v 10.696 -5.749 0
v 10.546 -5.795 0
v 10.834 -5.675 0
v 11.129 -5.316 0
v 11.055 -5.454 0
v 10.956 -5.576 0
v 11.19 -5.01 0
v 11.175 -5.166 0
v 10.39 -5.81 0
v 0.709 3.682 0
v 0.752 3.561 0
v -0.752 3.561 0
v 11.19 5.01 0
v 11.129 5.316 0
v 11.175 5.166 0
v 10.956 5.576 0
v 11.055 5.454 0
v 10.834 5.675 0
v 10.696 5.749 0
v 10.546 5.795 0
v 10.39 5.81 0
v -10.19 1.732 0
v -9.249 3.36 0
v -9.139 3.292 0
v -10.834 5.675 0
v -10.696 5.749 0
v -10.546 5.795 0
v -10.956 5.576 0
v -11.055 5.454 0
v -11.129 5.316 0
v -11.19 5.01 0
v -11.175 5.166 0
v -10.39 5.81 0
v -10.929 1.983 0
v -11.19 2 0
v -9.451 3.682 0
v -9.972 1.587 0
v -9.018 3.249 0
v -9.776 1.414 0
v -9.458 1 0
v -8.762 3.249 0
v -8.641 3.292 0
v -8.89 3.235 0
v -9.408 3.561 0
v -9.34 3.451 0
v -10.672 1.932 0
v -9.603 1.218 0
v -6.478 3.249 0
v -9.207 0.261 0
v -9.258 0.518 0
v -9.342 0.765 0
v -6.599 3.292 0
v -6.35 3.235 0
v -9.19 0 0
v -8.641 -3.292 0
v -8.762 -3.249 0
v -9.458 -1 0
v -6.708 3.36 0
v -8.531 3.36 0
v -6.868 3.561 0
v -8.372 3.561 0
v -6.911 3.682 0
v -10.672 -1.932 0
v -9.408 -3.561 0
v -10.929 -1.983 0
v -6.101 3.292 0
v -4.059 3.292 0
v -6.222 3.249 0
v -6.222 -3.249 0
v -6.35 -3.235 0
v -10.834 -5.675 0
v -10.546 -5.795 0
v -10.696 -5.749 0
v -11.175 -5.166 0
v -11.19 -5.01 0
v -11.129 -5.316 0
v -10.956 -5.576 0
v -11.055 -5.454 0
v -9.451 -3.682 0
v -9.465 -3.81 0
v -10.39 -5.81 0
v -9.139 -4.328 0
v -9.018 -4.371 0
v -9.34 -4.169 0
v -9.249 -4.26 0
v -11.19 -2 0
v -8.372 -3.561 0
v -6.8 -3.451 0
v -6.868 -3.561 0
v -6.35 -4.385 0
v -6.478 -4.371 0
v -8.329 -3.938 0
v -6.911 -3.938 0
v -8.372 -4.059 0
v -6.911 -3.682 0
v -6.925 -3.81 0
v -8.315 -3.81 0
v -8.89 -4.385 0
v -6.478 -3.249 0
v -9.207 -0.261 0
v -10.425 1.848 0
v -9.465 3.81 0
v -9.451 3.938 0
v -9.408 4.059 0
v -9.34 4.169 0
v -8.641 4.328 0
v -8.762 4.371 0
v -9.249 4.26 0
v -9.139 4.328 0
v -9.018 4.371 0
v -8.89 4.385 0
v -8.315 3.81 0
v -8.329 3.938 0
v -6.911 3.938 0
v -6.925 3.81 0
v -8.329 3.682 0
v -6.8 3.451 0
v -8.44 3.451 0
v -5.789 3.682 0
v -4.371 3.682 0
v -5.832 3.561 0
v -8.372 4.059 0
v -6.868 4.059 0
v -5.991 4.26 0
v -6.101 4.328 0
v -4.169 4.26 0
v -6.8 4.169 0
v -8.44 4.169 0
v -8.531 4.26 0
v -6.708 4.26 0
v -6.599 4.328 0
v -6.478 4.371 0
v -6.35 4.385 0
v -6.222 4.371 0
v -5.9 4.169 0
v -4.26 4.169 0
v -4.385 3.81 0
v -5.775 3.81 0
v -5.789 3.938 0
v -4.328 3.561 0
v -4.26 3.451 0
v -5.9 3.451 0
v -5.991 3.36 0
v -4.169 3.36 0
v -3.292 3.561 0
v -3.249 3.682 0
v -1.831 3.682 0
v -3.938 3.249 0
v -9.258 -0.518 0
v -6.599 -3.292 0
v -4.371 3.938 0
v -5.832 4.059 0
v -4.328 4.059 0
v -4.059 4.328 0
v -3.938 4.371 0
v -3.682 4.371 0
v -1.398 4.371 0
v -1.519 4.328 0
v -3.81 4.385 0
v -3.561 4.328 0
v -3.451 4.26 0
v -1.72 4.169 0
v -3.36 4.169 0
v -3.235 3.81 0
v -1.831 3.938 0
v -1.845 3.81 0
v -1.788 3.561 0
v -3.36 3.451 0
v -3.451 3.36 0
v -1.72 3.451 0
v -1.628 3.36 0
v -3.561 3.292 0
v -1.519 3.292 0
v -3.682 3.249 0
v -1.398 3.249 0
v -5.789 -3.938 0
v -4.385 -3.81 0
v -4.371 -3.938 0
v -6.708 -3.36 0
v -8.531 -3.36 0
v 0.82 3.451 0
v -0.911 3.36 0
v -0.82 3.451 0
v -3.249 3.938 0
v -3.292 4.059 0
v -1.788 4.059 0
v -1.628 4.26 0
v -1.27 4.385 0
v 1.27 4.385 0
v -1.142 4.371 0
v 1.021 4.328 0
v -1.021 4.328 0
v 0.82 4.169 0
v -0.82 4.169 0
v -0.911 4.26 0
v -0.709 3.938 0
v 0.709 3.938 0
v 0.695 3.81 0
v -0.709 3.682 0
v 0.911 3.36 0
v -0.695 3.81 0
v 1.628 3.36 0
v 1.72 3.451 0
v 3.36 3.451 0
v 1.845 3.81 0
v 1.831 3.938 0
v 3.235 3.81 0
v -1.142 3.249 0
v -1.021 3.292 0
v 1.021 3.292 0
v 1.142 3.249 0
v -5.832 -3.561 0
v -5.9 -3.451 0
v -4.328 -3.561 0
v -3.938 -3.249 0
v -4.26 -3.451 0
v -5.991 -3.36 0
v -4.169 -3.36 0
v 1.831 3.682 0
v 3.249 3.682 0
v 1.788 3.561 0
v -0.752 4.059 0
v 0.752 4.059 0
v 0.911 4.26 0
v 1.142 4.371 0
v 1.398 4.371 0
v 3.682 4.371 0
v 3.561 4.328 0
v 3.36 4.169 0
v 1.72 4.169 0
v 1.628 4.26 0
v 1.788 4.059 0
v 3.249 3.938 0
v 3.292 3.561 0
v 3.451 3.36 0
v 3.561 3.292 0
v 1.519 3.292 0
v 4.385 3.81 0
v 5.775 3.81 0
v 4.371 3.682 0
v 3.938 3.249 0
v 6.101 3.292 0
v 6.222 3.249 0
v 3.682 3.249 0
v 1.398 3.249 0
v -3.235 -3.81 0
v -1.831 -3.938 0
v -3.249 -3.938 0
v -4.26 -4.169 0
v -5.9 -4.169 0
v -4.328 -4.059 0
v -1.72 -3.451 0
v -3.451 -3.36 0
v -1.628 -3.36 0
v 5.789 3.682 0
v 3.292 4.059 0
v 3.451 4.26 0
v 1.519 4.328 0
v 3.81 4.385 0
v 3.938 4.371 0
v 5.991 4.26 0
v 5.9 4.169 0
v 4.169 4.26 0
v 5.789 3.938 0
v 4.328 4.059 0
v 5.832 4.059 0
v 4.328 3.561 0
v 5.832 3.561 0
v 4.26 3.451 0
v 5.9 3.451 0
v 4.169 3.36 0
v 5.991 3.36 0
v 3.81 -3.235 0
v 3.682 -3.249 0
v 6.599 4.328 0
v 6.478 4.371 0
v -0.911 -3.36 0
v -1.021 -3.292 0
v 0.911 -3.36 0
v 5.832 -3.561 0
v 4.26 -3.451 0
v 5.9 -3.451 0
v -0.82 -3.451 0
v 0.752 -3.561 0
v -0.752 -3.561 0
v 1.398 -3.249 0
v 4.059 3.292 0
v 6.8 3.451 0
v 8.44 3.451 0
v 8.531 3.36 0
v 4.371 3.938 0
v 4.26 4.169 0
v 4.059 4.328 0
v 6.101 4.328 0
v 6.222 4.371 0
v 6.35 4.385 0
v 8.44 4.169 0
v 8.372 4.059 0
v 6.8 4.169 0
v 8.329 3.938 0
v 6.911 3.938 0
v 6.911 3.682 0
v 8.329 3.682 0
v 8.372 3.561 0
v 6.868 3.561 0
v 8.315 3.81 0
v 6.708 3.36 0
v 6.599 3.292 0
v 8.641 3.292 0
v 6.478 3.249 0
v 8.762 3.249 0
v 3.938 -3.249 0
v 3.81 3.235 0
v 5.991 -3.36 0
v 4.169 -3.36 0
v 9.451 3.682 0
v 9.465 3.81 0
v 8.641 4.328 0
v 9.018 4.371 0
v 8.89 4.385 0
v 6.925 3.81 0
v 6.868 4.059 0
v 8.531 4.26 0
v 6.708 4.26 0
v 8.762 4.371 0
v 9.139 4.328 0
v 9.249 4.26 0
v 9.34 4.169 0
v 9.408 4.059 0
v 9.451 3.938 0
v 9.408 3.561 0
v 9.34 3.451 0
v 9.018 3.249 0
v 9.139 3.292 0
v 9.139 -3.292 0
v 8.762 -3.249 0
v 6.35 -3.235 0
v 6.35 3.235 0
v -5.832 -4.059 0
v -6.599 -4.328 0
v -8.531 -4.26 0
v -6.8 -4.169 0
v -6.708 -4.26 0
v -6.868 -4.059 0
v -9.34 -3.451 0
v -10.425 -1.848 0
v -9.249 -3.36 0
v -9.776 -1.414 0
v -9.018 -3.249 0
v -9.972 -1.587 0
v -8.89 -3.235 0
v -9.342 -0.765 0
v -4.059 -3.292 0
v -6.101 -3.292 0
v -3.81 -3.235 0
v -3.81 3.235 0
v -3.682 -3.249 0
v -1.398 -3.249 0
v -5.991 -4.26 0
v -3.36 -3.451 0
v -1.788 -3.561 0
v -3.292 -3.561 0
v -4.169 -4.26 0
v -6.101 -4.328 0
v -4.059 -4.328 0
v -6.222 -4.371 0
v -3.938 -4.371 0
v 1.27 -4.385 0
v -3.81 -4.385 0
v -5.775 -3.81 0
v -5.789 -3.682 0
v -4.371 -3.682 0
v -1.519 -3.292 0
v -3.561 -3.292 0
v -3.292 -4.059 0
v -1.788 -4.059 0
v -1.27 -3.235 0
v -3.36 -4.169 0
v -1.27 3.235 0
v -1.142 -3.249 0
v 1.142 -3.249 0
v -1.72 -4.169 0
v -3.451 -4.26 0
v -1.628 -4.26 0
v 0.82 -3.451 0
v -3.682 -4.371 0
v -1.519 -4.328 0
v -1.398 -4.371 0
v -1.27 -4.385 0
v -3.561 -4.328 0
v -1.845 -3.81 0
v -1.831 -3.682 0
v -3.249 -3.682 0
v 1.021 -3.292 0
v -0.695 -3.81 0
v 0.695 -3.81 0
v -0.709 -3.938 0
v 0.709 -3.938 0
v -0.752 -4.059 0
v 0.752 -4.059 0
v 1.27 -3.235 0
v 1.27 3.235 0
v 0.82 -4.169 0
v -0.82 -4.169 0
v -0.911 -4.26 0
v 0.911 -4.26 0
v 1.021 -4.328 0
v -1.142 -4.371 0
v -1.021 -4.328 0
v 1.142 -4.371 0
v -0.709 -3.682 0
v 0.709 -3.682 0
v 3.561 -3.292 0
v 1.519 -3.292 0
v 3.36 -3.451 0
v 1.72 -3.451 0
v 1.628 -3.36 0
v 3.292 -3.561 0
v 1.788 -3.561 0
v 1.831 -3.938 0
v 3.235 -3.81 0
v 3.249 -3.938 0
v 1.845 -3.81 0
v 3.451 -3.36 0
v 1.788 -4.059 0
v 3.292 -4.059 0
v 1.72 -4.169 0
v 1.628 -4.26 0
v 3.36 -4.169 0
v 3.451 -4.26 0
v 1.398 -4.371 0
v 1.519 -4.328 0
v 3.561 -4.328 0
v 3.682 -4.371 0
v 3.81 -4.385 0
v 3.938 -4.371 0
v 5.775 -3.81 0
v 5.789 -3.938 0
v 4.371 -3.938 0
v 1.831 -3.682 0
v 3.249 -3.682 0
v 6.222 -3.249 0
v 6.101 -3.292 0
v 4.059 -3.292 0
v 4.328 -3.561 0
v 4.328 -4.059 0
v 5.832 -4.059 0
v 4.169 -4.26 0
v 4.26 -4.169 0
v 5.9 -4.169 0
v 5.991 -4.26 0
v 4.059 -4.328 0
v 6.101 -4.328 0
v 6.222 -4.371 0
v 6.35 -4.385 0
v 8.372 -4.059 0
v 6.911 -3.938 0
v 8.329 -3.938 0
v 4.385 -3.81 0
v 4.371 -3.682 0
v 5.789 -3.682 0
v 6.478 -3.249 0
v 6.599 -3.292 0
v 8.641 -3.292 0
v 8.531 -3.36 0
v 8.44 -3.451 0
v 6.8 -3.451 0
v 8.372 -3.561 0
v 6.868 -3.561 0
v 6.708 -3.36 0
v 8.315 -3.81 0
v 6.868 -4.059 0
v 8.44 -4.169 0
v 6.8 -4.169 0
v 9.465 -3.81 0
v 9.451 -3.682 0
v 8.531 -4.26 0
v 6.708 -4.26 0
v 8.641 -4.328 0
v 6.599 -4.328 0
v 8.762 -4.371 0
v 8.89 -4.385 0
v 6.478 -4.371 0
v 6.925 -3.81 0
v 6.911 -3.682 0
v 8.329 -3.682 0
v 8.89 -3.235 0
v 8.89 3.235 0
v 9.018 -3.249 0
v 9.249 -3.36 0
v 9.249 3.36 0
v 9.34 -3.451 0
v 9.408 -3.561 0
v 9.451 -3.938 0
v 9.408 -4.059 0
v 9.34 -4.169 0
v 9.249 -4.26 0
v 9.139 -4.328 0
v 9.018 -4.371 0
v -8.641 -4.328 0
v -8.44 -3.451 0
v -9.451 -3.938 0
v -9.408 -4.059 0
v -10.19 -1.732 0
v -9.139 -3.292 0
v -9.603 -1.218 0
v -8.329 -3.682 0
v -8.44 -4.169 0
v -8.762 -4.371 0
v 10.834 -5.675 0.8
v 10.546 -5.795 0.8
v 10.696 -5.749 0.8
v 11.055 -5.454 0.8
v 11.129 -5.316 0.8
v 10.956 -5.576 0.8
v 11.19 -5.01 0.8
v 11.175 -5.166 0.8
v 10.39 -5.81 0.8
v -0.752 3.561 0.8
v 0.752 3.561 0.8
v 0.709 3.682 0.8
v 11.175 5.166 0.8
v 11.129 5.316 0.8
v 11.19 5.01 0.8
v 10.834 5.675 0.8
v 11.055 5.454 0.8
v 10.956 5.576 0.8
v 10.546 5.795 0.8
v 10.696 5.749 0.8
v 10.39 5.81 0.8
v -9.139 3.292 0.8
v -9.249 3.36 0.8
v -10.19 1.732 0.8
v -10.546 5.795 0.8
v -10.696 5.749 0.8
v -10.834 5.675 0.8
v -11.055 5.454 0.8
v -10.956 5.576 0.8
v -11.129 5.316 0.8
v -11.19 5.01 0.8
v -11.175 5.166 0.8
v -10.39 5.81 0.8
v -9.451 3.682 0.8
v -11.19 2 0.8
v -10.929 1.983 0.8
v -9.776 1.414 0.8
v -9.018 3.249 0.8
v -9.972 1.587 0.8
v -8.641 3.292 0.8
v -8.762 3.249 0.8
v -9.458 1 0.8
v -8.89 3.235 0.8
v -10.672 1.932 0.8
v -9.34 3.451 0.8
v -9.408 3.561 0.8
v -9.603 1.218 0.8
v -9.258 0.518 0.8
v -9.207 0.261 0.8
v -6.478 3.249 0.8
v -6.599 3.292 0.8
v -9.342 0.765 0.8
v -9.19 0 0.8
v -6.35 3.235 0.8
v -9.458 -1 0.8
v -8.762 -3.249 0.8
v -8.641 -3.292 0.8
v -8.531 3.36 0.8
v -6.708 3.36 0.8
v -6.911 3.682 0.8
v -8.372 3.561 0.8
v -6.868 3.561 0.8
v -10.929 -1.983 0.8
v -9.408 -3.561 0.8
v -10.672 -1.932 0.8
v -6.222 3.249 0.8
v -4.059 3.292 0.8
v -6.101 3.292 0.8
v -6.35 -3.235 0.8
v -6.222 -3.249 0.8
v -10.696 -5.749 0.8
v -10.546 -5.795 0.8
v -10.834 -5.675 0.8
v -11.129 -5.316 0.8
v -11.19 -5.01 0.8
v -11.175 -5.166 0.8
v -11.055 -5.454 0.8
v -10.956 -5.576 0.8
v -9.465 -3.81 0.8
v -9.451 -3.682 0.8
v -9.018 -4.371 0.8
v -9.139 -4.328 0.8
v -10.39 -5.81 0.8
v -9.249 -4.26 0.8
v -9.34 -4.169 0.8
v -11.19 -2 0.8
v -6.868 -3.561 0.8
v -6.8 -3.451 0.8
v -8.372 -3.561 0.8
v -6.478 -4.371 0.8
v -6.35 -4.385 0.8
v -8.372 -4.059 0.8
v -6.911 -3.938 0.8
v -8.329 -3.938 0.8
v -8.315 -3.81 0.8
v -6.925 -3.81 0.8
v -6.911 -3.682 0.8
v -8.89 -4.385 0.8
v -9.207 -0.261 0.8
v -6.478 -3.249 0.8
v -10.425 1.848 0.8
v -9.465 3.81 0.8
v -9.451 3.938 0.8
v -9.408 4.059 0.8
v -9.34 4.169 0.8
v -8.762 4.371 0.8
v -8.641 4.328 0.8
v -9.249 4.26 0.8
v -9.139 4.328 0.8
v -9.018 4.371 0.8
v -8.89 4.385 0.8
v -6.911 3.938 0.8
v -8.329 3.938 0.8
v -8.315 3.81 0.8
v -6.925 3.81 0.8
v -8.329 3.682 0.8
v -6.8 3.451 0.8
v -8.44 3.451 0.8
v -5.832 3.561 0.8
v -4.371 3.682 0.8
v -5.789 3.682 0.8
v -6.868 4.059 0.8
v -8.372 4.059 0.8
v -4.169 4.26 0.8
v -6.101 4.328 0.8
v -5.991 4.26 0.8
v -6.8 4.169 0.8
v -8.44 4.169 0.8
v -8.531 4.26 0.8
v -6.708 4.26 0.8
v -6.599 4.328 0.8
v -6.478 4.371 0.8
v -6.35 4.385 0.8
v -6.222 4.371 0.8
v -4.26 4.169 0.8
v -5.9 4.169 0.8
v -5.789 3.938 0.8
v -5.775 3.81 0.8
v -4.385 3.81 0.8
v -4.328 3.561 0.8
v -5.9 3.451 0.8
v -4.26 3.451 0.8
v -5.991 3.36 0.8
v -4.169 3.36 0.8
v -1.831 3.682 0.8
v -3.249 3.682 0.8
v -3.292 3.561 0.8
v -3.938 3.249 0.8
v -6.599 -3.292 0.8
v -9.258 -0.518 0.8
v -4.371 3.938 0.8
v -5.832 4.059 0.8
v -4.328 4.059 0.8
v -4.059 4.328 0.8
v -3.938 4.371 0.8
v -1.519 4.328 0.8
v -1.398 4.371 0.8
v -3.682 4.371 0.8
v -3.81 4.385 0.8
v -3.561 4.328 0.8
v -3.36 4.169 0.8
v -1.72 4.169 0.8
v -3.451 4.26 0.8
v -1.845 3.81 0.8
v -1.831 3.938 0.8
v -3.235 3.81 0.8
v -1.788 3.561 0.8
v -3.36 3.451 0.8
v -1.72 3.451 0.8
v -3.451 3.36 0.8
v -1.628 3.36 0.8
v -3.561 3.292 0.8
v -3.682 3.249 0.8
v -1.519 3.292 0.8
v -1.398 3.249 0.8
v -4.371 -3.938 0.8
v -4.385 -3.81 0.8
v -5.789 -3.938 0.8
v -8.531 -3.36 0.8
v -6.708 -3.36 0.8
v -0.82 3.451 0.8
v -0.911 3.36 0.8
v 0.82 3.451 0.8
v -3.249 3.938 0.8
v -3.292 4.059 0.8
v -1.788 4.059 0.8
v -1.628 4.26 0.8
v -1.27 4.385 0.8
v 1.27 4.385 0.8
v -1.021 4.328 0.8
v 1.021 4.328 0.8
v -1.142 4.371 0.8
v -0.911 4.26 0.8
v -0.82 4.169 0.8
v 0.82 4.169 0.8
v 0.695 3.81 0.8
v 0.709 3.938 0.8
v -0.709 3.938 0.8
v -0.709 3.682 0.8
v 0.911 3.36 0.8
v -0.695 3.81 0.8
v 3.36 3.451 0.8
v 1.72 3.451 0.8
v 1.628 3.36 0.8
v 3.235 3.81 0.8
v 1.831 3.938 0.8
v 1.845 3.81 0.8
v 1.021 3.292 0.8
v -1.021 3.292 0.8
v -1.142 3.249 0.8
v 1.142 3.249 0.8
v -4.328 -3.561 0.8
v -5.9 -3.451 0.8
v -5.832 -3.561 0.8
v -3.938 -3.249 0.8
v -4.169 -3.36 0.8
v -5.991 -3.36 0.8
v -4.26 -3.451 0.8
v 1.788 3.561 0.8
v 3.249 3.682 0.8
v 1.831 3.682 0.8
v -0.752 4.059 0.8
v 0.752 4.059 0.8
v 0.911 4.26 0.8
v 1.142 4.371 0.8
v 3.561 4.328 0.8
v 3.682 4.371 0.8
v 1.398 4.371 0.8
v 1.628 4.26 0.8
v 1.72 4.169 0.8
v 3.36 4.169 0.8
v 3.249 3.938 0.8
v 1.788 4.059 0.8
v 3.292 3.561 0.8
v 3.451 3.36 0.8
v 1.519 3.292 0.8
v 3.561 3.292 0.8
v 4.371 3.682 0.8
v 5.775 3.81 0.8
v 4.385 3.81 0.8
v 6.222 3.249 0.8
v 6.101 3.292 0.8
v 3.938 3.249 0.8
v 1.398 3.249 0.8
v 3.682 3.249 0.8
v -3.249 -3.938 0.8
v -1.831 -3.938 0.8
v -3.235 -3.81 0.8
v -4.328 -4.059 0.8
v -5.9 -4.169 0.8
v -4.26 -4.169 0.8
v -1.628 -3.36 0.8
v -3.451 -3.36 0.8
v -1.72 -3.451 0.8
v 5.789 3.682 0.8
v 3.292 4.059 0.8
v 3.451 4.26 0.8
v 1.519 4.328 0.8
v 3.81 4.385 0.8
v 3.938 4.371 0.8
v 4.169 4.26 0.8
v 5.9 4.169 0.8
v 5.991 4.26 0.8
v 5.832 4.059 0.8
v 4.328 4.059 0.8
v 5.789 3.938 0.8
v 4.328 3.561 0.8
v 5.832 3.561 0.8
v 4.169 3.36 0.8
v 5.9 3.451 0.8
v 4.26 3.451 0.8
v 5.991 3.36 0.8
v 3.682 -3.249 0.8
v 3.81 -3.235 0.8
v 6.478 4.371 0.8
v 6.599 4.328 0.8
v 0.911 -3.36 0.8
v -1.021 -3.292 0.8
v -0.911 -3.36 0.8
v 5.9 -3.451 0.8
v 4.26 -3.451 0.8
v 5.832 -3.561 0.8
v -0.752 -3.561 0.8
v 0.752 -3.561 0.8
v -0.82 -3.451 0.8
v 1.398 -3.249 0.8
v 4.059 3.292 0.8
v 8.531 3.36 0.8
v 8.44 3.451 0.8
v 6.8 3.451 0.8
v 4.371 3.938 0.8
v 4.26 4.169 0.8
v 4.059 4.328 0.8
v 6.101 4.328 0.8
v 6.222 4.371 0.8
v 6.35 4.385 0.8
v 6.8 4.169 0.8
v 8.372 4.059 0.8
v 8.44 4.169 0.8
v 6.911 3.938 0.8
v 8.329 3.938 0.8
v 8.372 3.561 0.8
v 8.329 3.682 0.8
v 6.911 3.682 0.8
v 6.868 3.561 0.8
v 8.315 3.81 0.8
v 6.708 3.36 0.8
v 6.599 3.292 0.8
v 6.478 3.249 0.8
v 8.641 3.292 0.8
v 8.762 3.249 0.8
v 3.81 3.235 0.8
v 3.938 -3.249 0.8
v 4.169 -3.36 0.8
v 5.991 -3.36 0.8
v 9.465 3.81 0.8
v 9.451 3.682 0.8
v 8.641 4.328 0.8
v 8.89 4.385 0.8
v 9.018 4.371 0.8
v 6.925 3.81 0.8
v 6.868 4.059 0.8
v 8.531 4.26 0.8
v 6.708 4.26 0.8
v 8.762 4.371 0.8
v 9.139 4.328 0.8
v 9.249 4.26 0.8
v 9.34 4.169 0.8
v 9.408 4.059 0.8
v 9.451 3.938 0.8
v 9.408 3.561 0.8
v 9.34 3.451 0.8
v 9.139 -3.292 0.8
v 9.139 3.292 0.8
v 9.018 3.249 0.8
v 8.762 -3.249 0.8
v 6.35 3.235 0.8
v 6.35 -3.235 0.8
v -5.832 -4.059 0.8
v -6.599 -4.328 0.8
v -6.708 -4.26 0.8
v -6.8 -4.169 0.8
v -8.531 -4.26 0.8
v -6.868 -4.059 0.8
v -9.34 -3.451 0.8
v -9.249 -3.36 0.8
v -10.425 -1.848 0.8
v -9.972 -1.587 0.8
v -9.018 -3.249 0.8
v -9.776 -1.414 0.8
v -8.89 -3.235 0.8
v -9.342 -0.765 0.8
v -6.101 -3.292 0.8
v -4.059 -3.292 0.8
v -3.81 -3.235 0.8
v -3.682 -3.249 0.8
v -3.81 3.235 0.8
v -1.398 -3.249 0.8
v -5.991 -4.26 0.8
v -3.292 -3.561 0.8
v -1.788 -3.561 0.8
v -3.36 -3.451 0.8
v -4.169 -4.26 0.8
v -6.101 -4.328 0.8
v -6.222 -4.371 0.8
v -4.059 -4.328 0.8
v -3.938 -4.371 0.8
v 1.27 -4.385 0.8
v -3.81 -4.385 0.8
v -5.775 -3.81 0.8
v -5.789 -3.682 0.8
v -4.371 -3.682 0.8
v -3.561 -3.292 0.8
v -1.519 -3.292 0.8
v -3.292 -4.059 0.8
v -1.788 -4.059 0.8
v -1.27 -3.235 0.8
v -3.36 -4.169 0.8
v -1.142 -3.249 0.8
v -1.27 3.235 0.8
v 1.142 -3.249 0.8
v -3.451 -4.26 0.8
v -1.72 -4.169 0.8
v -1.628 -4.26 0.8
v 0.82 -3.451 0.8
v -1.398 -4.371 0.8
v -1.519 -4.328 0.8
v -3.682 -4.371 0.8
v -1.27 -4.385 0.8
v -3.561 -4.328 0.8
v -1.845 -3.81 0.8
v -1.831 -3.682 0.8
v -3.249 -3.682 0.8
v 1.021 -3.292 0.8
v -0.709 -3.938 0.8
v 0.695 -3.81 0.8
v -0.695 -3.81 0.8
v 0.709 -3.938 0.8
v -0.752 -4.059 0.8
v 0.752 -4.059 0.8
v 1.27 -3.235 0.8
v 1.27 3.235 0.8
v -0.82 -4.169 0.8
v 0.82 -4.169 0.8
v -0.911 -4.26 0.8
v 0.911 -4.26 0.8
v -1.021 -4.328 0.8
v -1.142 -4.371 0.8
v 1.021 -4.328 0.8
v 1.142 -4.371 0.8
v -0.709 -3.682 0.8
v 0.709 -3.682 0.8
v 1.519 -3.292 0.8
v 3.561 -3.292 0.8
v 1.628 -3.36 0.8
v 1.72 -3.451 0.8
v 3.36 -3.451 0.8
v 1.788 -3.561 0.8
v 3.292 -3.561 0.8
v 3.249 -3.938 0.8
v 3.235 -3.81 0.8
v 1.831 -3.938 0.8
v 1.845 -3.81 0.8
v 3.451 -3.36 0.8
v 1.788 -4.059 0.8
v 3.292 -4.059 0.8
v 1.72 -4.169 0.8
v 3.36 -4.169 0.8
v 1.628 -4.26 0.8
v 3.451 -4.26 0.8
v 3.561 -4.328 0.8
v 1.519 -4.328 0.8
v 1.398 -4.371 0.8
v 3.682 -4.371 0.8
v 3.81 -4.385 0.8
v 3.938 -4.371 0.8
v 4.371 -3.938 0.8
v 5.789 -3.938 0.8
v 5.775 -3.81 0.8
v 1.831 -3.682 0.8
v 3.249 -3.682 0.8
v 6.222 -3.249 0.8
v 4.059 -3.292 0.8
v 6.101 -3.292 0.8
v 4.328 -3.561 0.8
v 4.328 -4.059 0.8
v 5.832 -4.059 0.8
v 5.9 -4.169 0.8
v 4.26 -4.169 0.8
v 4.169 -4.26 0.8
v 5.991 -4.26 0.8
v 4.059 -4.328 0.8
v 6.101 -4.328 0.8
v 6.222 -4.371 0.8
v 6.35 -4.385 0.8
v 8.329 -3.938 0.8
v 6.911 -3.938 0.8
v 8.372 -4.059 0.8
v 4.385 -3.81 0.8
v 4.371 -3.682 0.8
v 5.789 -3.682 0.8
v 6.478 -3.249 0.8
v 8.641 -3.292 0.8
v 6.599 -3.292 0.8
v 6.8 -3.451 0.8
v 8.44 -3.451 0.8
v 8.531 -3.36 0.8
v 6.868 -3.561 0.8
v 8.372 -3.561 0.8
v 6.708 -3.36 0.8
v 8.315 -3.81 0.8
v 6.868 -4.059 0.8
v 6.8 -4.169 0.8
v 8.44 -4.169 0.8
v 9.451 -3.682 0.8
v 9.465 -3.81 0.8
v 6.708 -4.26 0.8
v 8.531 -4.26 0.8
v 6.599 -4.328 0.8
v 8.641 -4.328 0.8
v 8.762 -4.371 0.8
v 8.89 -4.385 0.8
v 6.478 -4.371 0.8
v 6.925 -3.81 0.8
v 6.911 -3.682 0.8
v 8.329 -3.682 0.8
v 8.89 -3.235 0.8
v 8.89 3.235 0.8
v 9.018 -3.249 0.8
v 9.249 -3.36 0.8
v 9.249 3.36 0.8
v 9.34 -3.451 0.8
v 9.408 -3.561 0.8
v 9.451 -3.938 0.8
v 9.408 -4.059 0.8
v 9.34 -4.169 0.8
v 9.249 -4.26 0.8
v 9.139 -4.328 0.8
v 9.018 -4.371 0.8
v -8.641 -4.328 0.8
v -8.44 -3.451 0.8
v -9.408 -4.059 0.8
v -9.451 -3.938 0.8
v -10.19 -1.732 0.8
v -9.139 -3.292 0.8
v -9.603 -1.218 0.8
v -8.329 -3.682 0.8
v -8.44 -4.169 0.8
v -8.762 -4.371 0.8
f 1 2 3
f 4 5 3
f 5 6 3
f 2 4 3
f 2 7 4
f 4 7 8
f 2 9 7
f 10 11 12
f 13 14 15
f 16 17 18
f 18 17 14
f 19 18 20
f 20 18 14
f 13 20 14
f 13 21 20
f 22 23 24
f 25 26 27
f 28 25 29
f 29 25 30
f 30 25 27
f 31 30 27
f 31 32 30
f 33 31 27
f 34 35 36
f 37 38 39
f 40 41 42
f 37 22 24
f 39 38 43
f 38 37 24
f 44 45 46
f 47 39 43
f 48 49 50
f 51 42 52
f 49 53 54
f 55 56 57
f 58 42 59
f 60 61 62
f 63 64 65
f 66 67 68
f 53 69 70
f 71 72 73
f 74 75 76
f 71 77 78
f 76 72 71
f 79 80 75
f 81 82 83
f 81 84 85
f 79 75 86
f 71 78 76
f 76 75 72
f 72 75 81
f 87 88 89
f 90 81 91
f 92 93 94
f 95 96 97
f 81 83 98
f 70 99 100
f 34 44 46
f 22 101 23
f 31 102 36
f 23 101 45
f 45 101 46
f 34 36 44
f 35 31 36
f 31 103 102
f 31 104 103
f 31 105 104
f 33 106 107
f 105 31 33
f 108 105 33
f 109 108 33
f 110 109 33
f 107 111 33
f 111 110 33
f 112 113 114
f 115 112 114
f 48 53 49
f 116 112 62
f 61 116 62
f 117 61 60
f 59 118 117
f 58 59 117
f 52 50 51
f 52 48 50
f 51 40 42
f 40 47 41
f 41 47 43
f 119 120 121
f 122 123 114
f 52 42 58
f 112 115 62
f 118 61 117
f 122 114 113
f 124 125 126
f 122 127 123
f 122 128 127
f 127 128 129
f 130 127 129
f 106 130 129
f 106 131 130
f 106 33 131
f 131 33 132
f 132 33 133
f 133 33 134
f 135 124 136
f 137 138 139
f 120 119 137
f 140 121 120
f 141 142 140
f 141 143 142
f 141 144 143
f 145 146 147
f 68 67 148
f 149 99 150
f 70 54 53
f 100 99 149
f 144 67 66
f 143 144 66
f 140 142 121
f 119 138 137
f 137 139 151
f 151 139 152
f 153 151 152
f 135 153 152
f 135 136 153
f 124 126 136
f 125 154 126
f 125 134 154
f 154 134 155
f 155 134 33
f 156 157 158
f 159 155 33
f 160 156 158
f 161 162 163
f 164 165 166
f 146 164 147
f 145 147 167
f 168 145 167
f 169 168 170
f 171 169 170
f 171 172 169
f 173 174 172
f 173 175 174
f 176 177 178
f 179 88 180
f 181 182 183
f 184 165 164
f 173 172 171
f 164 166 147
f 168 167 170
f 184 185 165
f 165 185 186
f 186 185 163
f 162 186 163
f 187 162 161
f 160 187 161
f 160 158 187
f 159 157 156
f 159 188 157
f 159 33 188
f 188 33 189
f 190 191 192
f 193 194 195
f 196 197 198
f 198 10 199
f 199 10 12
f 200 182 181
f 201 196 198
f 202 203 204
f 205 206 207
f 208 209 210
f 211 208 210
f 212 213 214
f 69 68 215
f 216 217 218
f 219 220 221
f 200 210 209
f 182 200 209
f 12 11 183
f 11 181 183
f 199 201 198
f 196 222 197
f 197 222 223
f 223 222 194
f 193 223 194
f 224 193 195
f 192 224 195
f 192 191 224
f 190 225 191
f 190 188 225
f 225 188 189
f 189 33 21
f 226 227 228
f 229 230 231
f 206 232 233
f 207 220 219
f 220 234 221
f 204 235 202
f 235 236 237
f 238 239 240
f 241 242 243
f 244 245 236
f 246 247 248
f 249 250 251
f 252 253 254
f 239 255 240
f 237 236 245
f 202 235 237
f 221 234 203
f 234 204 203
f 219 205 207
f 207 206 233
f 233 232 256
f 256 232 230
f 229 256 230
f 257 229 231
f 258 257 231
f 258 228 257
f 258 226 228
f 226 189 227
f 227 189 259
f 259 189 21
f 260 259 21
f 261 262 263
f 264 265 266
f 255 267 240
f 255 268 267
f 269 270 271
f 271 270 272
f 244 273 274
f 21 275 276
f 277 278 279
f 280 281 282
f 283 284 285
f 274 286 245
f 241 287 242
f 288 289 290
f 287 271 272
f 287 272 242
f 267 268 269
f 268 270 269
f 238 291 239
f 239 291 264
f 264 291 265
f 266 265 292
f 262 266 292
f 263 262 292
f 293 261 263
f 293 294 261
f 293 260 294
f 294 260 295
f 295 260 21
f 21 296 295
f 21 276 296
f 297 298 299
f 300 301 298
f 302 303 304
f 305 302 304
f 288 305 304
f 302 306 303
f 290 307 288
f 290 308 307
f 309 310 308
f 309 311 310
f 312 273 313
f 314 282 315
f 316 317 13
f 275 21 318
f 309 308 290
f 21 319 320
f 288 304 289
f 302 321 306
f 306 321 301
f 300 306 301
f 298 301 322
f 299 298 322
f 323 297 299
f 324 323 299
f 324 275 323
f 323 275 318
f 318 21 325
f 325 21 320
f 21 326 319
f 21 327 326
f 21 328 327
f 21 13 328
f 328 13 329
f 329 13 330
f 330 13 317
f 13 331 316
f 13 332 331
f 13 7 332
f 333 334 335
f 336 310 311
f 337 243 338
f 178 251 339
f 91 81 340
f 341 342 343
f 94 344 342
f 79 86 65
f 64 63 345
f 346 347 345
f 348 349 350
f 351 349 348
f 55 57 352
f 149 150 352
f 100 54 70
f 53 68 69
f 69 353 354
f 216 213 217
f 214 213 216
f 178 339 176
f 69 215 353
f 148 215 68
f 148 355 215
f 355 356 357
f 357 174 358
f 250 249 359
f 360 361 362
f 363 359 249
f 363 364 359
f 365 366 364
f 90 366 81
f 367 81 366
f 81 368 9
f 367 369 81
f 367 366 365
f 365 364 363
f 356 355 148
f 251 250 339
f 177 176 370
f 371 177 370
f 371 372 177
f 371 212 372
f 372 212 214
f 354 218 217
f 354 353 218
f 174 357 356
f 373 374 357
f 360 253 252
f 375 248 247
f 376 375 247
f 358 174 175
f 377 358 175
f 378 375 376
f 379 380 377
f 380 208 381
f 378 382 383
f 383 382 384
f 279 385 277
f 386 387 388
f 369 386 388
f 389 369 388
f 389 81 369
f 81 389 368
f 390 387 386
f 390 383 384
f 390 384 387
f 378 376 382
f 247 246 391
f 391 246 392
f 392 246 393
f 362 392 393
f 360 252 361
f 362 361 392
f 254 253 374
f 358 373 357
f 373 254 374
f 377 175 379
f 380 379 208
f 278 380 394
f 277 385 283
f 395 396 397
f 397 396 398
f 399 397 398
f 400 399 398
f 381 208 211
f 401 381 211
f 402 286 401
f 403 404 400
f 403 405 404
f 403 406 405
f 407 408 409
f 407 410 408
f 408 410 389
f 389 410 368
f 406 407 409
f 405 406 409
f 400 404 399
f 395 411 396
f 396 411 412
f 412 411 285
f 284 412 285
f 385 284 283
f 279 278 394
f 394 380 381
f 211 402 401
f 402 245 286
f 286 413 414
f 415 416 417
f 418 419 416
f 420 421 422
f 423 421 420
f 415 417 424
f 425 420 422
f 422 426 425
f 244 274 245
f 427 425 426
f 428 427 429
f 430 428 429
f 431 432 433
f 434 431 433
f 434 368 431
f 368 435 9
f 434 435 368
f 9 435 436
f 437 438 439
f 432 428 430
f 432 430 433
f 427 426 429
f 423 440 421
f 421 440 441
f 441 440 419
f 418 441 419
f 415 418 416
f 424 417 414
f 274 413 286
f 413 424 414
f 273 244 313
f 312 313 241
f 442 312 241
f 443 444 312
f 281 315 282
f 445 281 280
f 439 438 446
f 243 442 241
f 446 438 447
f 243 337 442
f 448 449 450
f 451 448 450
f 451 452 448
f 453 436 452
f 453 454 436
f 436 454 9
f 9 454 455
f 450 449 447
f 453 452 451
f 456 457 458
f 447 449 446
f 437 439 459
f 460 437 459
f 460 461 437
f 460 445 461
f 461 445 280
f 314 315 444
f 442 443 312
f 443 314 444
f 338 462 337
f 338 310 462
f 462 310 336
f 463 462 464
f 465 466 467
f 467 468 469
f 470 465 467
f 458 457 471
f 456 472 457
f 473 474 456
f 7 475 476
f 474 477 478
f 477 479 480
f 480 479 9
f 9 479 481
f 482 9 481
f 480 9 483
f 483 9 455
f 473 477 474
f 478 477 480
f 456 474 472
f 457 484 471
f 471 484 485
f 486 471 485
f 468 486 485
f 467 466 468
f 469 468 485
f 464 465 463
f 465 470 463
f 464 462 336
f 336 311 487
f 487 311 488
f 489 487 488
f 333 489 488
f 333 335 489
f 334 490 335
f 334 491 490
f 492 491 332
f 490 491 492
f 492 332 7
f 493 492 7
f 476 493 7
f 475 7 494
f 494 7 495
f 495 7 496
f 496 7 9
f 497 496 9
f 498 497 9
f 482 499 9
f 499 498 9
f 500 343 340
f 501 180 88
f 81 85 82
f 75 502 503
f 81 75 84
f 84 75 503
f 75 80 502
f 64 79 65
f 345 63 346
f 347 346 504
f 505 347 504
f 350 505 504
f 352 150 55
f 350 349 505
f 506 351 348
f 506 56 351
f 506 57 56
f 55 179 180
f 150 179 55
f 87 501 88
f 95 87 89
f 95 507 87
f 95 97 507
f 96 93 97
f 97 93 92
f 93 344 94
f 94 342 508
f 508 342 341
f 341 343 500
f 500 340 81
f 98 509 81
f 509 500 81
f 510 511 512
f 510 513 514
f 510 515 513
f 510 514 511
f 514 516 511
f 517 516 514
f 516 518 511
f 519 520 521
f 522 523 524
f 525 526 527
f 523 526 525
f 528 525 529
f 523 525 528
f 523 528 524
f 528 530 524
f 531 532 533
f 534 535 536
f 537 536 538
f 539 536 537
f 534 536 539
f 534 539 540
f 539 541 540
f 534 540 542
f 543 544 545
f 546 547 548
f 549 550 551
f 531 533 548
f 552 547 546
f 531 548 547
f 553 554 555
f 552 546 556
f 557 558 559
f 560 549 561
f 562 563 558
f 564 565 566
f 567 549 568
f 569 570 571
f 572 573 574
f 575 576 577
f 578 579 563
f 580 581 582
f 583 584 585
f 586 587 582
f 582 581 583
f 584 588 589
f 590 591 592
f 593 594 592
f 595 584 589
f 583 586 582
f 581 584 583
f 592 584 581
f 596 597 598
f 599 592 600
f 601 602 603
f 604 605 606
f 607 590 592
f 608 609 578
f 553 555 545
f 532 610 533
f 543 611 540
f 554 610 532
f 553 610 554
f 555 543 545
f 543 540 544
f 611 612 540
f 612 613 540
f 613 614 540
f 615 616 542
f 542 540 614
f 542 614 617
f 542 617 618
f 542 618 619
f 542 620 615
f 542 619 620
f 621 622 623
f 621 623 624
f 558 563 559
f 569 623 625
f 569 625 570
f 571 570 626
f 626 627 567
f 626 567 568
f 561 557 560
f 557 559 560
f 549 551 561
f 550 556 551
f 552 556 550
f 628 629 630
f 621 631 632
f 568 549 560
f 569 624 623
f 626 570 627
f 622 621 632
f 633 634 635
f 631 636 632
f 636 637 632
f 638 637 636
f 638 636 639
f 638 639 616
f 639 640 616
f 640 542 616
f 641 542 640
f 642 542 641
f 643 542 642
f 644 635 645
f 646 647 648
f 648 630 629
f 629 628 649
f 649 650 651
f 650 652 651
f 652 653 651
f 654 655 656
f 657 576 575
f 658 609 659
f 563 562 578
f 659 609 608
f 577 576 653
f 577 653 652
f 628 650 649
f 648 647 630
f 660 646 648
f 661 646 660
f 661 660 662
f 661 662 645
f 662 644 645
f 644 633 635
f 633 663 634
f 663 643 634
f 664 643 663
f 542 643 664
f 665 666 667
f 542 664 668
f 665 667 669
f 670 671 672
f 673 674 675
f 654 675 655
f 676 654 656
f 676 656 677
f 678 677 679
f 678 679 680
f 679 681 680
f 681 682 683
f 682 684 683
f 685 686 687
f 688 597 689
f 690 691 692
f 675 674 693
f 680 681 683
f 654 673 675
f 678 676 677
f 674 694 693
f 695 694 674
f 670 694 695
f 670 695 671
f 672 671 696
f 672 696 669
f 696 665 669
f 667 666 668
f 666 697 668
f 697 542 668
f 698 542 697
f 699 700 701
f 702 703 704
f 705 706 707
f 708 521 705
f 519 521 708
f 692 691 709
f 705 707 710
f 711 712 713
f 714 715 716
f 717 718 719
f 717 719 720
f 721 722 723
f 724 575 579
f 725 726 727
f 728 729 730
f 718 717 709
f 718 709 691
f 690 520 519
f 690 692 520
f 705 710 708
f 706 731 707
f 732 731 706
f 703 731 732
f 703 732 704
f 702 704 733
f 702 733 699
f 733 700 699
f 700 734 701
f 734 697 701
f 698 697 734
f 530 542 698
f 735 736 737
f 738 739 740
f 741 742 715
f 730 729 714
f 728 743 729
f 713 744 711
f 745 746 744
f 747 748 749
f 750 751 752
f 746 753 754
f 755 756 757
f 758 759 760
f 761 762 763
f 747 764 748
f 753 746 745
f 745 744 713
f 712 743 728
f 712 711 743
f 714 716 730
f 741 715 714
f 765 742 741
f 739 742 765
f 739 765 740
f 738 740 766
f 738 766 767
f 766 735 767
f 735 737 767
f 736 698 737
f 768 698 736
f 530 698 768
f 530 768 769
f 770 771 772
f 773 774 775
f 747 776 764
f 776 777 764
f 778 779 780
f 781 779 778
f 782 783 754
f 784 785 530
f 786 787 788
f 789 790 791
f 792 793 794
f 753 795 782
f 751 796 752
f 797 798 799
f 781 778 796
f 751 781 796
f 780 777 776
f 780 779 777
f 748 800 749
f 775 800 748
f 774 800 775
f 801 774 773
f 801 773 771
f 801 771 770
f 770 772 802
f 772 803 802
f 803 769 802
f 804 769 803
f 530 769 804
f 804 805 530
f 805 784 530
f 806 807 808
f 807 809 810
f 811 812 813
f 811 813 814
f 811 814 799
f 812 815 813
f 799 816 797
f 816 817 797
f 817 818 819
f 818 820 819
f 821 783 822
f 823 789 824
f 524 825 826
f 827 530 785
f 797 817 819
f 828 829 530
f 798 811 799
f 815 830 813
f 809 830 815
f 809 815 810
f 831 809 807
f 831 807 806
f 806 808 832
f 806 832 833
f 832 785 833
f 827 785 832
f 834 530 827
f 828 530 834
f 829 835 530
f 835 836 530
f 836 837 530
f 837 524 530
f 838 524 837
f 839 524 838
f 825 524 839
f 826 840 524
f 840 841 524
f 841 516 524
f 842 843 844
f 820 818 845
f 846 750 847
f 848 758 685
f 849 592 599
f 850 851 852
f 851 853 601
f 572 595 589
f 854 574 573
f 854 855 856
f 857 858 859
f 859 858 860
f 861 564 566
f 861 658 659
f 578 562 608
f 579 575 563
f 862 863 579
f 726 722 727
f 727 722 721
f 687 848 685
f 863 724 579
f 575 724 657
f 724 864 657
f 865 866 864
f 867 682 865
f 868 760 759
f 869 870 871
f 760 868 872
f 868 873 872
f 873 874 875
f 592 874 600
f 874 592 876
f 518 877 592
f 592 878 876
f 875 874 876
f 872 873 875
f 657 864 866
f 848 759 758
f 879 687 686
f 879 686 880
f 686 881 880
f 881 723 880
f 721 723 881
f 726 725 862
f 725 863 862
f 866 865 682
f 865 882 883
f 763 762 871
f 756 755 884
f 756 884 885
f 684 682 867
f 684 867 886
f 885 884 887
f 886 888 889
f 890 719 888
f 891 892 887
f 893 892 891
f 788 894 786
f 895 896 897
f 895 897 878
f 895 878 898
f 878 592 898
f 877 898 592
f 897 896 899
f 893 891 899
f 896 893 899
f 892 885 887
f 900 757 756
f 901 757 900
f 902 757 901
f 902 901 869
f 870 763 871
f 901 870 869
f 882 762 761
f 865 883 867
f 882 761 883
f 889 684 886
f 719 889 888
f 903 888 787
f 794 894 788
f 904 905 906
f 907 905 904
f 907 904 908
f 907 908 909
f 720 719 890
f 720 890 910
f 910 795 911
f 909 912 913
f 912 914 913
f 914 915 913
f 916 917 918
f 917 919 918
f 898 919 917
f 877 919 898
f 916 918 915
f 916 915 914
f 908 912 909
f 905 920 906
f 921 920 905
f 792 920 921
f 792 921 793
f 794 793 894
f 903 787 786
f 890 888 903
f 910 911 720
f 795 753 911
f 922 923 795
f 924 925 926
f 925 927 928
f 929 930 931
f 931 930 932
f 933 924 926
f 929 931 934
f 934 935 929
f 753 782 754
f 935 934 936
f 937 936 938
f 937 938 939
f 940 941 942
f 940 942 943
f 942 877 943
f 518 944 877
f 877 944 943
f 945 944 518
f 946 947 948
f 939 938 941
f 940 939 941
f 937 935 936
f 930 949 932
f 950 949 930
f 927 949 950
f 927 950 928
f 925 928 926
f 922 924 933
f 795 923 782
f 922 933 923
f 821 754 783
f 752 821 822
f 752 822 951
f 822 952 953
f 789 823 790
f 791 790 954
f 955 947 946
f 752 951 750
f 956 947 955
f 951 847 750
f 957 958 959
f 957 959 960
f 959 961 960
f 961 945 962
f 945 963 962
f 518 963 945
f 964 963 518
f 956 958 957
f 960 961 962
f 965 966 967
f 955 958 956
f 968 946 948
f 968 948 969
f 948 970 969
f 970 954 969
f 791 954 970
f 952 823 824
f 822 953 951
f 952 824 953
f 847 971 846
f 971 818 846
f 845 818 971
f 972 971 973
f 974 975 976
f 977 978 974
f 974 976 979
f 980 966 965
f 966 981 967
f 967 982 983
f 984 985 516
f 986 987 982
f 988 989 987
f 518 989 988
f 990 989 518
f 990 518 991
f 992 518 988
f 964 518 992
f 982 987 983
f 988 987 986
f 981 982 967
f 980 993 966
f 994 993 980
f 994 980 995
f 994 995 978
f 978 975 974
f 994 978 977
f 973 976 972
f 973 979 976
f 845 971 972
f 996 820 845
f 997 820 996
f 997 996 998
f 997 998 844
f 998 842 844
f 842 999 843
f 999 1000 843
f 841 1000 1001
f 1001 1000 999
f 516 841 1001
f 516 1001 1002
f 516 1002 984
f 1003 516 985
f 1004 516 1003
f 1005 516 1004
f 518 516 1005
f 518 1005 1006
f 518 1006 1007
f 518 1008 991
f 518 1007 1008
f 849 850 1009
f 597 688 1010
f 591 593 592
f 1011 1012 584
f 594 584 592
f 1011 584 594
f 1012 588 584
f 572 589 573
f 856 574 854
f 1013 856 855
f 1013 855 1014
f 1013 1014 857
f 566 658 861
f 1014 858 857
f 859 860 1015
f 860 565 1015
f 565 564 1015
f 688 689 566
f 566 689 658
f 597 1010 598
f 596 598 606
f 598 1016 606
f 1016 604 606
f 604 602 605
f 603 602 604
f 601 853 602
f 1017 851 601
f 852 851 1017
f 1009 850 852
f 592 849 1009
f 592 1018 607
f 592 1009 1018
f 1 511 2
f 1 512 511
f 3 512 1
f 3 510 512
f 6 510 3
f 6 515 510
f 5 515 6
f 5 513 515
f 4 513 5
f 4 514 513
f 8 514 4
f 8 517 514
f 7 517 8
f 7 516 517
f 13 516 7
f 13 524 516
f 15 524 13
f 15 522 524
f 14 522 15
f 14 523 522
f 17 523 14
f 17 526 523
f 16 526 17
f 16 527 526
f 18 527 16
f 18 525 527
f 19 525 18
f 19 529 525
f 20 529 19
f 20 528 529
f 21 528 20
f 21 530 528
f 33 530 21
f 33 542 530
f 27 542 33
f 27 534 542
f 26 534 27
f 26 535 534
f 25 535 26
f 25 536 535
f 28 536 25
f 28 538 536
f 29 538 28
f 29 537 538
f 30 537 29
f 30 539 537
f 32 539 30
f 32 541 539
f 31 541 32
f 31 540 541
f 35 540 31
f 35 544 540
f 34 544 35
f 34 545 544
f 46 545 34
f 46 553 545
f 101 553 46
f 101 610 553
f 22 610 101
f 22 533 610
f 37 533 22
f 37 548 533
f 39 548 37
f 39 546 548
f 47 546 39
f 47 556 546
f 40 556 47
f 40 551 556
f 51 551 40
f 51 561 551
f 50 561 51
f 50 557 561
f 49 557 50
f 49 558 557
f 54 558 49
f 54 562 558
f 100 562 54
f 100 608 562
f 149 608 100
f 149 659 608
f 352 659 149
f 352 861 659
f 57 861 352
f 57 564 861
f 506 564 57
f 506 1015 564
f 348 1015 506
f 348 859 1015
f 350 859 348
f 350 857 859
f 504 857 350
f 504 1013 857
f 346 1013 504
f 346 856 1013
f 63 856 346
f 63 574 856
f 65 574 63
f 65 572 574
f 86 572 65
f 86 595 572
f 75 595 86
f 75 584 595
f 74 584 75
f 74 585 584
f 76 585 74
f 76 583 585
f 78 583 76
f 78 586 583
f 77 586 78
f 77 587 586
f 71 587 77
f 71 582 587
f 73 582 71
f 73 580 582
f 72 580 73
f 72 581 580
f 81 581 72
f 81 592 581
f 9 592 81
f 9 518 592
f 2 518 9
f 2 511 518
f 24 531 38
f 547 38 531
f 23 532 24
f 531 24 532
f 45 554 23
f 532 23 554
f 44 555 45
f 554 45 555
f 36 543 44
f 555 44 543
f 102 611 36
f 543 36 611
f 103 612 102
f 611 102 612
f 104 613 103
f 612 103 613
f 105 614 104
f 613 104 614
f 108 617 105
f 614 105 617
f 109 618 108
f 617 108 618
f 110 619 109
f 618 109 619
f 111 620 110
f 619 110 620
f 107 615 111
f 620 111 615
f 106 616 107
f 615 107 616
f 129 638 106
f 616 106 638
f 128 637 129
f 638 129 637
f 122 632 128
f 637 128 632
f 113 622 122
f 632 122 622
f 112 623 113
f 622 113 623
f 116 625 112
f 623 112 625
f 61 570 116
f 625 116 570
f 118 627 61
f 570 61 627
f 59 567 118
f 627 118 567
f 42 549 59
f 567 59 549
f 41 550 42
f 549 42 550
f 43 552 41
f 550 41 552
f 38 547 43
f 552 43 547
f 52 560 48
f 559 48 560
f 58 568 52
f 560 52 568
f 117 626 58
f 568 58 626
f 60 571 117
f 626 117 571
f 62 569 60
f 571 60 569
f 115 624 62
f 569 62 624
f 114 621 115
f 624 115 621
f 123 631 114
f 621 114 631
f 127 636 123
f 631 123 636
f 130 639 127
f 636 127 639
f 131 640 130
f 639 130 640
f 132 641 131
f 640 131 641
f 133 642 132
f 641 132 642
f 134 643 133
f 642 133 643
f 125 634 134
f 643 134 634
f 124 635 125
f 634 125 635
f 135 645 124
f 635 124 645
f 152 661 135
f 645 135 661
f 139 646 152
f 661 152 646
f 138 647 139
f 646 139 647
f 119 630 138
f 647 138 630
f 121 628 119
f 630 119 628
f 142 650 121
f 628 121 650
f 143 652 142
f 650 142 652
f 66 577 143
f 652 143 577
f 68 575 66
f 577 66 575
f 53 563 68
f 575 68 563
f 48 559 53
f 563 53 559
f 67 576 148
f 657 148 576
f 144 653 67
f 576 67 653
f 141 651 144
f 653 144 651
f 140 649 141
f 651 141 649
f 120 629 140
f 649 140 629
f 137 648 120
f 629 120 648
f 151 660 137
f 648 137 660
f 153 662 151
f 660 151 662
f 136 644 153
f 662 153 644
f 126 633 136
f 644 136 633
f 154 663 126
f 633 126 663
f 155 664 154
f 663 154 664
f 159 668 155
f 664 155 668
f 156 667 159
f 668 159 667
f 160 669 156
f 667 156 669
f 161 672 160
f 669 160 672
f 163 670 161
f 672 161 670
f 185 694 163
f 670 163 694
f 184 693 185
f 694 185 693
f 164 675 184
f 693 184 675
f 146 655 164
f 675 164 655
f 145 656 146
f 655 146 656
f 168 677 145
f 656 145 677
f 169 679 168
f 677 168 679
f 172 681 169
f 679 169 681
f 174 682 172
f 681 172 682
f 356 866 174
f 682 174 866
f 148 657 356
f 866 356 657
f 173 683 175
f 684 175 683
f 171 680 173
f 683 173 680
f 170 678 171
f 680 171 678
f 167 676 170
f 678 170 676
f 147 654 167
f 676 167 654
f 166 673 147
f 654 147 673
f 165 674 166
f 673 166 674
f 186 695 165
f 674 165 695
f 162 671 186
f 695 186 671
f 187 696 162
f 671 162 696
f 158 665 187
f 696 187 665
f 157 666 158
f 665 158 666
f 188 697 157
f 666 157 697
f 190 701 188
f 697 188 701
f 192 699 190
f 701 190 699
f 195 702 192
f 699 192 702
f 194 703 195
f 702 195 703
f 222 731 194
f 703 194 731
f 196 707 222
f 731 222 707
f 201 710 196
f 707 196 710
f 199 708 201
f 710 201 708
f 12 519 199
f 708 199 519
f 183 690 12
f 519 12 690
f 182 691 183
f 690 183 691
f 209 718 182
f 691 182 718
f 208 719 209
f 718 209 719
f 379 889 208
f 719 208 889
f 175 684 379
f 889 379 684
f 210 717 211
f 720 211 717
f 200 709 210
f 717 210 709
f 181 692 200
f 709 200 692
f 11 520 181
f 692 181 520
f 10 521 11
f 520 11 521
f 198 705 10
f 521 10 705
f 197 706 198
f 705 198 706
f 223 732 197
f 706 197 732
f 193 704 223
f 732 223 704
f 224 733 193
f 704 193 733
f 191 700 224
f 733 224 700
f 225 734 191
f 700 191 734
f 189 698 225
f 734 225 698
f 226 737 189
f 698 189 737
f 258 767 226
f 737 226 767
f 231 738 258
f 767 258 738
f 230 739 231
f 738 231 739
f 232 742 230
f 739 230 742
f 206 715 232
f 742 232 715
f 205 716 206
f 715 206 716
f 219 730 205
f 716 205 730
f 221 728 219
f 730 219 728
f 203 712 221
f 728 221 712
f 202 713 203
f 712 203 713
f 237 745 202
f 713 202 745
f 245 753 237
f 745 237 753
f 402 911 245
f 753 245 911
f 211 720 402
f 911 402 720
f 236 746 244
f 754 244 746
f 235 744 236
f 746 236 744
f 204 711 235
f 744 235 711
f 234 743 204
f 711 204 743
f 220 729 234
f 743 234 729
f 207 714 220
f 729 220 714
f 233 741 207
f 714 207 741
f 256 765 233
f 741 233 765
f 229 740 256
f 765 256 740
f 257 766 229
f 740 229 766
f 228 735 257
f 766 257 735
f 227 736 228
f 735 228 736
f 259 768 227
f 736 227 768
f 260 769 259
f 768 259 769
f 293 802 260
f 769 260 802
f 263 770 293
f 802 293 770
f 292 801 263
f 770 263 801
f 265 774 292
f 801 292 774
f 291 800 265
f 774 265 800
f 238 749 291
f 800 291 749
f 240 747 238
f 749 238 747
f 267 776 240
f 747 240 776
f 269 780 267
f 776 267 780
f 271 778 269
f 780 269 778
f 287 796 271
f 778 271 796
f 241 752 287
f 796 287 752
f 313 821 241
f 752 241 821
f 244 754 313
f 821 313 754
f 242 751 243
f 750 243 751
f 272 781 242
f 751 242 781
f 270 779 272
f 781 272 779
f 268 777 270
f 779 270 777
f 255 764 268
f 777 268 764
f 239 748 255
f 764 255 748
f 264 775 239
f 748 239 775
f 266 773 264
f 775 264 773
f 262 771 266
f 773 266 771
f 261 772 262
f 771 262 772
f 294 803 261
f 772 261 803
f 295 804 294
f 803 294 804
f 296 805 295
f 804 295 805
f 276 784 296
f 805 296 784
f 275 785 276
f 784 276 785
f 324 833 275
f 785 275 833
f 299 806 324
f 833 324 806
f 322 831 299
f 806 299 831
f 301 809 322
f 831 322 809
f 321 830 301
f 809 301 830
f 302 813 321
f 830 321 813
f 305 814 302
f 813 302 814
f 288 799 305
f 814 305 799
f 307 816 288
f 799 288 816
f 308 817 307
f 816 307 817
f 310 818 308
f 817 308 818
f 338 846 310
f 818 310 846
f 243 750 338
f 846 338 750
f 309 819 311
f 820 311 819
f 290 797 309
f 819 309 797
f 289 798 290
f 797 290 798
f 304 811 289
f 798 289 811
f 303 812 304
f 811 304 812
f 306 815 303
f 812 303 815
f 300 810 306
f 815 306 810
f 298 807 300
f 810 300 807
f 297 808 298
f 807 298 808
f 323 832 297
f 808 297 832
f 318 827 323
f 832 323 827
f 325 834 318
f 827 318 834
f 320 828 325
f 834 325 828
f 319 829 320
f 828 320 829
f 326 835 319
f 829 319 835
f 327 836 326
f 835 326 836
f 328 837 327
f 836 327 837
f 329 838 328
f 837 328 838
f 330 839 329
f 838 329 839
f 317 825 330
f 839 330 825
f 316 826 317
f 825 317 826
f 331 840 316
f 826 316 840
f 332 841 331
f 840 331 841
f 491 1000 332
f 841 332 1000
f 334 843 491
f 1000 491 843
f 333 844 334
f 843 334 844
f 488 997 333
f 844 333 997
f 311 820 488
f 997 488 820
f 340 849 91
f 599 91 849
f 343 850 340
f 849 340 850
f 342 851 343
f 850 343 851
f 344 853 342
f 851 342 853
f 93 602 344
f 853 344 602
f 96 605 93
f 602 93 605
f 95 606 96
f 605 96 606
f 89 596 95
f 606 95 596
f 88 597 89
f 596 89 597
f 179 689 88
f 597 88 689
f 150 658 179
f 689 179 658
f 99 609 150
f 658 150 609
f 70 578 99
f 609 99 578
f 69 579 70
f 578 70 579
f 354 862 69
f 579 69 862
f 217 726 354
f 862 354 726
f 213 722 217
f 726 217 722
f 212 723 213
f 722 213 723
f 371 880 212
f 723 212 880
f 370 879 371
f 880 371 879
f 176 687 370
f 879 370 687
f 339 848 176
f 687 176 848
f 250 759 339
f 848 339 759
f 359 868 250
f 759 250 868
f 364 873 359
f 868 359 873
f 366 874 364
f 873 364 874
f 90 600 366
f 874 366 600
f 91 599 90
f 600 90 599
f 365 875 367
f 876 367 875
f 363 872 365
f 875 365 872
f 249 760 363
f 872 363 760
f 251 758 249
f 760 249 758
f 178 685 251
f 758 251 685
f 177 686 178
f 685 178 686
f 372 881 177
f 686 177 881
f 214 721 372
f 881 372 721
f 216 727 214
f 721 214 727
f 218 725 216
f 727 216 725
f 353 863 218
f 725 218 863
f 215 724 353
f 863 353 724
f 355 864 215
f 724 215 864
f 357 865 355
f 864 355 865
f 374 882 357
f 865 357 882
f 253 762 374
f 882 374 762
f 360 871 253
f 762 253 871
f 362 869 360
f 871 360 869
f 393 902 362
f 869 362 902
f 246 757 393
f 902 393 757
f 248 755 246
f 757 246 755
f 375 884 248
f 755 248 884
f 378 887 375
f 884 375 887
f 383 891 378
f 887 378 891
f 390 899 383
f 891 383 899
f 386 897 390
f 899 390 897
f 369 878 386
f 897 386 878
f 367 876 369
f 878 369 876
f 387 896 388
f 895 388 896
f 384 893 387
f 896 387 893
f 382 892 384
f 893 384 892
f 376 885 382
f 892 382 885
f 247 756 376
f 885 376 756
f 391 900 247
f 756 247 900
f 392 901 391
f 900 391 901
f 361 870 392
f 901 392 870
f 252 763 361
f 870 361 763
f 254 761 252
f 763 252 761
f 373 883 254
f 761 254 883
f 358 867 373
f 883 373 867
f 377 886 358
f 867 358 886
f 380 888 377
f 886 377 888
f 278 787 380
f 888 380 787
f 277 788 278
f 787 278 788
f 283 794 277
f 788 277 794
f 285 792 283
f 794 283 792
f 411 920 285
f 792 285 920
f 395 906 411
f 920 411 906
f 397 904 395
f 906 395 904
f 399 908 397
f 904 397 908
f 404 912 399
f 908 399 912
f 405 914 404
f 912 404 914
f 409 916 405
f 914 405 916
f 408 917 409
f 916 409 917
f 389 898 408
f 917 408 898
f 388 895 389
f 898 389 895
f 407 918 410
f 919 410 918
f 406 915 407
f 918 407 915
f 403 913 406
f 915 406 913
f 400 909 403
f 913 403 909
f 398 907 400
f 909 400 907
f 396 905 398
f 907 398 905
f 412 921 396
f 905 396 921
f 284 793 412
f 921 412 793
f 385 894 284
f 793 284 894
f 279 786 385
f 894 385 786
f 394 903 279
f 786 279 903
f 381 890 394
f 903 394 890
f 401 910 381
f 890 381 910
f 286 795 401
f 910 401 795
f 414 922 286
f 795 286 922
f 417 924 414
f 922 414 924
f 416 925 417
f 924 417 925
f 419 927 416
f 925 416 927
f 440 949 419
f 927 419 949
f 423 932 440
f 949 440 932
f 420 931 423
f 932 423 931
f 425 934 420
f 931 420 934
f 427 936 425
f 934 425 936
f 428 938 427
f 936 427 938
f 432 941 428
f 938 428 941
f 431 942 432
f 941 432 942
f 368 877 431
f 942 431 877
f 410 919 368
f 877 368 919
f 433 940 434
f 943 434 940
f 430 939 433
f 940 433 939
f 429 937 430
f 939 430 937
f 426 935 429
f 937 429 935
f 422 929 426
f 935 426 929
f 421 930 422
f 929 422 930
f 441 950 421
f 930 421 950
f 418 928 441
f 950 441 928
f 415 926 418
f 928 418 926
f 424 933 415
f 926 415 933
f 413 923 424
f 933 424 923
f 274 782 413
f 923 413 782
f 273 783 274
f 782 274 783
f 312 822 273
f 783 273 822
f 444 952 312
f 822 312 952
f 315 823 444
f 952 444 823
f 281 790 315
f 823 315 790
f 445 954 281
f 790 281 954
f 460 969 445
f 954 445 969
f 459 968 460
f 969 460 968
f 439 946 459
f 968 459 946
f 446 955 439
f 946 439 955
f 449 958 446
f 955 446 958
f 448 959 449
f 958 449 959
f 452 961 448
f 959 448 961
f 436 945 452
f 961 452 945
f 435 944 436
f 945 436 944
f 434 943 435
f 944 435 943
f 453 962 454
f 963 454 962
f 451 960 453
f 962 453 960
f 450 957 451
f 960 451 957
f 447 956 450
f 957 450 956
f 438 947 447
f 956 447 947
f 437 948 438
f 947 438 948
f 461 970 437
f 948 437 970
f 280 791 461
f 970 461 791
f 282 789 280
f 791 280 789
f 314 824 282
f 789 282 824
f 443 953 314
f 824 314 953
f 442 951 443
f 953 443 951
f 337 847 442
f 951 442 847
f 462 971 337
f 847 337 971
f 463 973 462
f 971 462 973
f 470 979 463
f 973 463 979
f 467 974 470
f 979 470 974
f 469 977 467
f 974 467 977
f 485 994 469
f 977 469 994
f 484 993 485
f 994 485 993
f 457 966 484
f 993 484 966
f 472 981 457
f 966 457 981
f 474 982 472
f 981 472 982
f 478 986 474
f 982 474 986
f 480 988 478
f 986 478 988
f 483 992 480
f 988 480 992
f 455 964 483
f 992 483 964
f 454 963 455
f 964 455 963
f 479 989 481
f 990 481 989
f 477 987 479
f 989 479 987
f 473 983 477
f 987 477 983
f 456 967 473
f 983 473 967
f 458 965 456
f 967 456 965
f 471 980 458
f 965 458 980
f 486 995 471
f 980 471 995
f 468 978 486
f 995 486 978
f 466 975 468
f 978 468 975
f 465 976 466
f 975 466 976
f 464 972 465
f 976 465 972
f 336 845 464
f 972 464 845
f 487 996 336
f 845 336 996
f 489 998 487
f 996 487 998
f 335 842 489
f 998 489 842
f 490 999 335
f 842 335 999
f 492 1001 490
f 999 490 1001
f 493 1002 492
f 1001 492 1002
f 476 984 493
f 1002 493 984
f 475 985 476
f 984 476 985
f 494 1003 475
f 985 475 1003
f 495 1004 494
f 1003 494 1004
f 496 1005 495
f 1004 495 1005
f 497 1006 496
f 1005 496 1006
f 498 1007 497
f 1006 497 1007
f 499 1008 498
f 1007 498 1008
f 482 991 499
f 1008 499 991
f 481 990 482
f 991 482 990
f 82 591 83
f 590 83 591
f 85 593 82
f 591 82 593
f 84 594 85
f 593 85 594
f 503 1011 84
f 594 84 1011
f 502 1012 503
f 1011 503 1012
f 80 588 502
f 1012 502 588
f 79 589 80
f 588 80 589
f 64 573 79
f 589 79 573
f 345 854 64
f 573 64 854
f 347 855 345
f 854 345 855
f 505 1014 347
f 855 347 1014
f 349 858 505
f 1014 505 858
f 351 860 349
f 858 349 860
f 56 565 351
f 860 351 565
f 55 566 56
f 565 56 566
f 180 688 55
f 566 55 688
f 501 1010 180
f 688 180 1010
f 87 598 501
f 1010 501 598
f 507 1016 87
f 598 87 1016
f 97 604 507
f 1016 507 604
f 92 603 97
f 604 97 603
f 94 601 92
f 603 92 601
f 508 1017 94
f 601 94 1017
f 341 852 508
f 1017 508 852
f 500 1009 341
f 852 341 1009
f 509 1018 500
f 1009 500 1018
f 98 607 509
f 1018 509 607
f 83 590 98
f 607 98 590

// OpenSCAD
// Parametric Wire-Wrap Socket ID Tag
// Units: mm

pins = 16;                 // even DIP pin count
row_spacing_mil = 300;     // standard choices: 300, 400, 600, 900
thickness = 0.8;           // 0.6 to 1.0 mm recommended
pin_pitch = 2.54;          // DIP standard 0.100 in
hole_diameter = 1.15;      // tune for printer/material/post fit
end_margin = 2.3;          // plastic beyond first/last pin centers
side_margin = 2.0;         // plastic outside pin rows
notch_radius = 2.0;        // semicircular pin-1-end notch radius
corner_radius = 0.8;
center_window = false;     // optional center opening; labels normally cover solid tag
center_window_margin = 1.5;

function mil_to_mm(m) = m * 0.0254;
rows = pins / 2;
row_spacing = mil_to_mm(row_spacing_mil);
length = (rows - 1) * pin_pitch + 2 * end_margin;
width = row_spacing + 2 * side_margin;

module rounded_rect_2d(x, y, r) {
    hull() {
        for (sx=[-1,1], sy=[-1,1])
            translate([sx*(x/2-r), sy*(y/2-r)]) circle(r=r, $fn=32);
    }
}

module tag_2d() {
    difference() {
        rounded_rect_2d(length, width, corner_radius);

        // pin holes, viewed from the component/tag side.
        // Physical numbering follows DIP convention: pin 1 at upper-left
        // when the notch is at the left end; pin numbers increase CCW.
        for (i=[0:rows-1]) {
            x = -length/2 + end_margin + i*pin_pitch;
            translate([x, -row_spacing/2]) circle(d=hole_diameter, $fn=28);
            translate([x,  row_spacing/2]) circle(d=hole_diameter, $fn=28);
        }

        // orientation notch on pin-1 end (left end)
        translate([-length/2, 0]) circle(r=notch_radius, $fn=48);

        if (center_window) {
            window_len = max(1, length - 2*(end_margin + center_window_margin));
            window_wid = max(1, row_spacing - 2*center_window_margin);
            square([window_len, window_wid], center=true);
        }
    }
}

linear_extrude(height=thickness) tag_2d();
